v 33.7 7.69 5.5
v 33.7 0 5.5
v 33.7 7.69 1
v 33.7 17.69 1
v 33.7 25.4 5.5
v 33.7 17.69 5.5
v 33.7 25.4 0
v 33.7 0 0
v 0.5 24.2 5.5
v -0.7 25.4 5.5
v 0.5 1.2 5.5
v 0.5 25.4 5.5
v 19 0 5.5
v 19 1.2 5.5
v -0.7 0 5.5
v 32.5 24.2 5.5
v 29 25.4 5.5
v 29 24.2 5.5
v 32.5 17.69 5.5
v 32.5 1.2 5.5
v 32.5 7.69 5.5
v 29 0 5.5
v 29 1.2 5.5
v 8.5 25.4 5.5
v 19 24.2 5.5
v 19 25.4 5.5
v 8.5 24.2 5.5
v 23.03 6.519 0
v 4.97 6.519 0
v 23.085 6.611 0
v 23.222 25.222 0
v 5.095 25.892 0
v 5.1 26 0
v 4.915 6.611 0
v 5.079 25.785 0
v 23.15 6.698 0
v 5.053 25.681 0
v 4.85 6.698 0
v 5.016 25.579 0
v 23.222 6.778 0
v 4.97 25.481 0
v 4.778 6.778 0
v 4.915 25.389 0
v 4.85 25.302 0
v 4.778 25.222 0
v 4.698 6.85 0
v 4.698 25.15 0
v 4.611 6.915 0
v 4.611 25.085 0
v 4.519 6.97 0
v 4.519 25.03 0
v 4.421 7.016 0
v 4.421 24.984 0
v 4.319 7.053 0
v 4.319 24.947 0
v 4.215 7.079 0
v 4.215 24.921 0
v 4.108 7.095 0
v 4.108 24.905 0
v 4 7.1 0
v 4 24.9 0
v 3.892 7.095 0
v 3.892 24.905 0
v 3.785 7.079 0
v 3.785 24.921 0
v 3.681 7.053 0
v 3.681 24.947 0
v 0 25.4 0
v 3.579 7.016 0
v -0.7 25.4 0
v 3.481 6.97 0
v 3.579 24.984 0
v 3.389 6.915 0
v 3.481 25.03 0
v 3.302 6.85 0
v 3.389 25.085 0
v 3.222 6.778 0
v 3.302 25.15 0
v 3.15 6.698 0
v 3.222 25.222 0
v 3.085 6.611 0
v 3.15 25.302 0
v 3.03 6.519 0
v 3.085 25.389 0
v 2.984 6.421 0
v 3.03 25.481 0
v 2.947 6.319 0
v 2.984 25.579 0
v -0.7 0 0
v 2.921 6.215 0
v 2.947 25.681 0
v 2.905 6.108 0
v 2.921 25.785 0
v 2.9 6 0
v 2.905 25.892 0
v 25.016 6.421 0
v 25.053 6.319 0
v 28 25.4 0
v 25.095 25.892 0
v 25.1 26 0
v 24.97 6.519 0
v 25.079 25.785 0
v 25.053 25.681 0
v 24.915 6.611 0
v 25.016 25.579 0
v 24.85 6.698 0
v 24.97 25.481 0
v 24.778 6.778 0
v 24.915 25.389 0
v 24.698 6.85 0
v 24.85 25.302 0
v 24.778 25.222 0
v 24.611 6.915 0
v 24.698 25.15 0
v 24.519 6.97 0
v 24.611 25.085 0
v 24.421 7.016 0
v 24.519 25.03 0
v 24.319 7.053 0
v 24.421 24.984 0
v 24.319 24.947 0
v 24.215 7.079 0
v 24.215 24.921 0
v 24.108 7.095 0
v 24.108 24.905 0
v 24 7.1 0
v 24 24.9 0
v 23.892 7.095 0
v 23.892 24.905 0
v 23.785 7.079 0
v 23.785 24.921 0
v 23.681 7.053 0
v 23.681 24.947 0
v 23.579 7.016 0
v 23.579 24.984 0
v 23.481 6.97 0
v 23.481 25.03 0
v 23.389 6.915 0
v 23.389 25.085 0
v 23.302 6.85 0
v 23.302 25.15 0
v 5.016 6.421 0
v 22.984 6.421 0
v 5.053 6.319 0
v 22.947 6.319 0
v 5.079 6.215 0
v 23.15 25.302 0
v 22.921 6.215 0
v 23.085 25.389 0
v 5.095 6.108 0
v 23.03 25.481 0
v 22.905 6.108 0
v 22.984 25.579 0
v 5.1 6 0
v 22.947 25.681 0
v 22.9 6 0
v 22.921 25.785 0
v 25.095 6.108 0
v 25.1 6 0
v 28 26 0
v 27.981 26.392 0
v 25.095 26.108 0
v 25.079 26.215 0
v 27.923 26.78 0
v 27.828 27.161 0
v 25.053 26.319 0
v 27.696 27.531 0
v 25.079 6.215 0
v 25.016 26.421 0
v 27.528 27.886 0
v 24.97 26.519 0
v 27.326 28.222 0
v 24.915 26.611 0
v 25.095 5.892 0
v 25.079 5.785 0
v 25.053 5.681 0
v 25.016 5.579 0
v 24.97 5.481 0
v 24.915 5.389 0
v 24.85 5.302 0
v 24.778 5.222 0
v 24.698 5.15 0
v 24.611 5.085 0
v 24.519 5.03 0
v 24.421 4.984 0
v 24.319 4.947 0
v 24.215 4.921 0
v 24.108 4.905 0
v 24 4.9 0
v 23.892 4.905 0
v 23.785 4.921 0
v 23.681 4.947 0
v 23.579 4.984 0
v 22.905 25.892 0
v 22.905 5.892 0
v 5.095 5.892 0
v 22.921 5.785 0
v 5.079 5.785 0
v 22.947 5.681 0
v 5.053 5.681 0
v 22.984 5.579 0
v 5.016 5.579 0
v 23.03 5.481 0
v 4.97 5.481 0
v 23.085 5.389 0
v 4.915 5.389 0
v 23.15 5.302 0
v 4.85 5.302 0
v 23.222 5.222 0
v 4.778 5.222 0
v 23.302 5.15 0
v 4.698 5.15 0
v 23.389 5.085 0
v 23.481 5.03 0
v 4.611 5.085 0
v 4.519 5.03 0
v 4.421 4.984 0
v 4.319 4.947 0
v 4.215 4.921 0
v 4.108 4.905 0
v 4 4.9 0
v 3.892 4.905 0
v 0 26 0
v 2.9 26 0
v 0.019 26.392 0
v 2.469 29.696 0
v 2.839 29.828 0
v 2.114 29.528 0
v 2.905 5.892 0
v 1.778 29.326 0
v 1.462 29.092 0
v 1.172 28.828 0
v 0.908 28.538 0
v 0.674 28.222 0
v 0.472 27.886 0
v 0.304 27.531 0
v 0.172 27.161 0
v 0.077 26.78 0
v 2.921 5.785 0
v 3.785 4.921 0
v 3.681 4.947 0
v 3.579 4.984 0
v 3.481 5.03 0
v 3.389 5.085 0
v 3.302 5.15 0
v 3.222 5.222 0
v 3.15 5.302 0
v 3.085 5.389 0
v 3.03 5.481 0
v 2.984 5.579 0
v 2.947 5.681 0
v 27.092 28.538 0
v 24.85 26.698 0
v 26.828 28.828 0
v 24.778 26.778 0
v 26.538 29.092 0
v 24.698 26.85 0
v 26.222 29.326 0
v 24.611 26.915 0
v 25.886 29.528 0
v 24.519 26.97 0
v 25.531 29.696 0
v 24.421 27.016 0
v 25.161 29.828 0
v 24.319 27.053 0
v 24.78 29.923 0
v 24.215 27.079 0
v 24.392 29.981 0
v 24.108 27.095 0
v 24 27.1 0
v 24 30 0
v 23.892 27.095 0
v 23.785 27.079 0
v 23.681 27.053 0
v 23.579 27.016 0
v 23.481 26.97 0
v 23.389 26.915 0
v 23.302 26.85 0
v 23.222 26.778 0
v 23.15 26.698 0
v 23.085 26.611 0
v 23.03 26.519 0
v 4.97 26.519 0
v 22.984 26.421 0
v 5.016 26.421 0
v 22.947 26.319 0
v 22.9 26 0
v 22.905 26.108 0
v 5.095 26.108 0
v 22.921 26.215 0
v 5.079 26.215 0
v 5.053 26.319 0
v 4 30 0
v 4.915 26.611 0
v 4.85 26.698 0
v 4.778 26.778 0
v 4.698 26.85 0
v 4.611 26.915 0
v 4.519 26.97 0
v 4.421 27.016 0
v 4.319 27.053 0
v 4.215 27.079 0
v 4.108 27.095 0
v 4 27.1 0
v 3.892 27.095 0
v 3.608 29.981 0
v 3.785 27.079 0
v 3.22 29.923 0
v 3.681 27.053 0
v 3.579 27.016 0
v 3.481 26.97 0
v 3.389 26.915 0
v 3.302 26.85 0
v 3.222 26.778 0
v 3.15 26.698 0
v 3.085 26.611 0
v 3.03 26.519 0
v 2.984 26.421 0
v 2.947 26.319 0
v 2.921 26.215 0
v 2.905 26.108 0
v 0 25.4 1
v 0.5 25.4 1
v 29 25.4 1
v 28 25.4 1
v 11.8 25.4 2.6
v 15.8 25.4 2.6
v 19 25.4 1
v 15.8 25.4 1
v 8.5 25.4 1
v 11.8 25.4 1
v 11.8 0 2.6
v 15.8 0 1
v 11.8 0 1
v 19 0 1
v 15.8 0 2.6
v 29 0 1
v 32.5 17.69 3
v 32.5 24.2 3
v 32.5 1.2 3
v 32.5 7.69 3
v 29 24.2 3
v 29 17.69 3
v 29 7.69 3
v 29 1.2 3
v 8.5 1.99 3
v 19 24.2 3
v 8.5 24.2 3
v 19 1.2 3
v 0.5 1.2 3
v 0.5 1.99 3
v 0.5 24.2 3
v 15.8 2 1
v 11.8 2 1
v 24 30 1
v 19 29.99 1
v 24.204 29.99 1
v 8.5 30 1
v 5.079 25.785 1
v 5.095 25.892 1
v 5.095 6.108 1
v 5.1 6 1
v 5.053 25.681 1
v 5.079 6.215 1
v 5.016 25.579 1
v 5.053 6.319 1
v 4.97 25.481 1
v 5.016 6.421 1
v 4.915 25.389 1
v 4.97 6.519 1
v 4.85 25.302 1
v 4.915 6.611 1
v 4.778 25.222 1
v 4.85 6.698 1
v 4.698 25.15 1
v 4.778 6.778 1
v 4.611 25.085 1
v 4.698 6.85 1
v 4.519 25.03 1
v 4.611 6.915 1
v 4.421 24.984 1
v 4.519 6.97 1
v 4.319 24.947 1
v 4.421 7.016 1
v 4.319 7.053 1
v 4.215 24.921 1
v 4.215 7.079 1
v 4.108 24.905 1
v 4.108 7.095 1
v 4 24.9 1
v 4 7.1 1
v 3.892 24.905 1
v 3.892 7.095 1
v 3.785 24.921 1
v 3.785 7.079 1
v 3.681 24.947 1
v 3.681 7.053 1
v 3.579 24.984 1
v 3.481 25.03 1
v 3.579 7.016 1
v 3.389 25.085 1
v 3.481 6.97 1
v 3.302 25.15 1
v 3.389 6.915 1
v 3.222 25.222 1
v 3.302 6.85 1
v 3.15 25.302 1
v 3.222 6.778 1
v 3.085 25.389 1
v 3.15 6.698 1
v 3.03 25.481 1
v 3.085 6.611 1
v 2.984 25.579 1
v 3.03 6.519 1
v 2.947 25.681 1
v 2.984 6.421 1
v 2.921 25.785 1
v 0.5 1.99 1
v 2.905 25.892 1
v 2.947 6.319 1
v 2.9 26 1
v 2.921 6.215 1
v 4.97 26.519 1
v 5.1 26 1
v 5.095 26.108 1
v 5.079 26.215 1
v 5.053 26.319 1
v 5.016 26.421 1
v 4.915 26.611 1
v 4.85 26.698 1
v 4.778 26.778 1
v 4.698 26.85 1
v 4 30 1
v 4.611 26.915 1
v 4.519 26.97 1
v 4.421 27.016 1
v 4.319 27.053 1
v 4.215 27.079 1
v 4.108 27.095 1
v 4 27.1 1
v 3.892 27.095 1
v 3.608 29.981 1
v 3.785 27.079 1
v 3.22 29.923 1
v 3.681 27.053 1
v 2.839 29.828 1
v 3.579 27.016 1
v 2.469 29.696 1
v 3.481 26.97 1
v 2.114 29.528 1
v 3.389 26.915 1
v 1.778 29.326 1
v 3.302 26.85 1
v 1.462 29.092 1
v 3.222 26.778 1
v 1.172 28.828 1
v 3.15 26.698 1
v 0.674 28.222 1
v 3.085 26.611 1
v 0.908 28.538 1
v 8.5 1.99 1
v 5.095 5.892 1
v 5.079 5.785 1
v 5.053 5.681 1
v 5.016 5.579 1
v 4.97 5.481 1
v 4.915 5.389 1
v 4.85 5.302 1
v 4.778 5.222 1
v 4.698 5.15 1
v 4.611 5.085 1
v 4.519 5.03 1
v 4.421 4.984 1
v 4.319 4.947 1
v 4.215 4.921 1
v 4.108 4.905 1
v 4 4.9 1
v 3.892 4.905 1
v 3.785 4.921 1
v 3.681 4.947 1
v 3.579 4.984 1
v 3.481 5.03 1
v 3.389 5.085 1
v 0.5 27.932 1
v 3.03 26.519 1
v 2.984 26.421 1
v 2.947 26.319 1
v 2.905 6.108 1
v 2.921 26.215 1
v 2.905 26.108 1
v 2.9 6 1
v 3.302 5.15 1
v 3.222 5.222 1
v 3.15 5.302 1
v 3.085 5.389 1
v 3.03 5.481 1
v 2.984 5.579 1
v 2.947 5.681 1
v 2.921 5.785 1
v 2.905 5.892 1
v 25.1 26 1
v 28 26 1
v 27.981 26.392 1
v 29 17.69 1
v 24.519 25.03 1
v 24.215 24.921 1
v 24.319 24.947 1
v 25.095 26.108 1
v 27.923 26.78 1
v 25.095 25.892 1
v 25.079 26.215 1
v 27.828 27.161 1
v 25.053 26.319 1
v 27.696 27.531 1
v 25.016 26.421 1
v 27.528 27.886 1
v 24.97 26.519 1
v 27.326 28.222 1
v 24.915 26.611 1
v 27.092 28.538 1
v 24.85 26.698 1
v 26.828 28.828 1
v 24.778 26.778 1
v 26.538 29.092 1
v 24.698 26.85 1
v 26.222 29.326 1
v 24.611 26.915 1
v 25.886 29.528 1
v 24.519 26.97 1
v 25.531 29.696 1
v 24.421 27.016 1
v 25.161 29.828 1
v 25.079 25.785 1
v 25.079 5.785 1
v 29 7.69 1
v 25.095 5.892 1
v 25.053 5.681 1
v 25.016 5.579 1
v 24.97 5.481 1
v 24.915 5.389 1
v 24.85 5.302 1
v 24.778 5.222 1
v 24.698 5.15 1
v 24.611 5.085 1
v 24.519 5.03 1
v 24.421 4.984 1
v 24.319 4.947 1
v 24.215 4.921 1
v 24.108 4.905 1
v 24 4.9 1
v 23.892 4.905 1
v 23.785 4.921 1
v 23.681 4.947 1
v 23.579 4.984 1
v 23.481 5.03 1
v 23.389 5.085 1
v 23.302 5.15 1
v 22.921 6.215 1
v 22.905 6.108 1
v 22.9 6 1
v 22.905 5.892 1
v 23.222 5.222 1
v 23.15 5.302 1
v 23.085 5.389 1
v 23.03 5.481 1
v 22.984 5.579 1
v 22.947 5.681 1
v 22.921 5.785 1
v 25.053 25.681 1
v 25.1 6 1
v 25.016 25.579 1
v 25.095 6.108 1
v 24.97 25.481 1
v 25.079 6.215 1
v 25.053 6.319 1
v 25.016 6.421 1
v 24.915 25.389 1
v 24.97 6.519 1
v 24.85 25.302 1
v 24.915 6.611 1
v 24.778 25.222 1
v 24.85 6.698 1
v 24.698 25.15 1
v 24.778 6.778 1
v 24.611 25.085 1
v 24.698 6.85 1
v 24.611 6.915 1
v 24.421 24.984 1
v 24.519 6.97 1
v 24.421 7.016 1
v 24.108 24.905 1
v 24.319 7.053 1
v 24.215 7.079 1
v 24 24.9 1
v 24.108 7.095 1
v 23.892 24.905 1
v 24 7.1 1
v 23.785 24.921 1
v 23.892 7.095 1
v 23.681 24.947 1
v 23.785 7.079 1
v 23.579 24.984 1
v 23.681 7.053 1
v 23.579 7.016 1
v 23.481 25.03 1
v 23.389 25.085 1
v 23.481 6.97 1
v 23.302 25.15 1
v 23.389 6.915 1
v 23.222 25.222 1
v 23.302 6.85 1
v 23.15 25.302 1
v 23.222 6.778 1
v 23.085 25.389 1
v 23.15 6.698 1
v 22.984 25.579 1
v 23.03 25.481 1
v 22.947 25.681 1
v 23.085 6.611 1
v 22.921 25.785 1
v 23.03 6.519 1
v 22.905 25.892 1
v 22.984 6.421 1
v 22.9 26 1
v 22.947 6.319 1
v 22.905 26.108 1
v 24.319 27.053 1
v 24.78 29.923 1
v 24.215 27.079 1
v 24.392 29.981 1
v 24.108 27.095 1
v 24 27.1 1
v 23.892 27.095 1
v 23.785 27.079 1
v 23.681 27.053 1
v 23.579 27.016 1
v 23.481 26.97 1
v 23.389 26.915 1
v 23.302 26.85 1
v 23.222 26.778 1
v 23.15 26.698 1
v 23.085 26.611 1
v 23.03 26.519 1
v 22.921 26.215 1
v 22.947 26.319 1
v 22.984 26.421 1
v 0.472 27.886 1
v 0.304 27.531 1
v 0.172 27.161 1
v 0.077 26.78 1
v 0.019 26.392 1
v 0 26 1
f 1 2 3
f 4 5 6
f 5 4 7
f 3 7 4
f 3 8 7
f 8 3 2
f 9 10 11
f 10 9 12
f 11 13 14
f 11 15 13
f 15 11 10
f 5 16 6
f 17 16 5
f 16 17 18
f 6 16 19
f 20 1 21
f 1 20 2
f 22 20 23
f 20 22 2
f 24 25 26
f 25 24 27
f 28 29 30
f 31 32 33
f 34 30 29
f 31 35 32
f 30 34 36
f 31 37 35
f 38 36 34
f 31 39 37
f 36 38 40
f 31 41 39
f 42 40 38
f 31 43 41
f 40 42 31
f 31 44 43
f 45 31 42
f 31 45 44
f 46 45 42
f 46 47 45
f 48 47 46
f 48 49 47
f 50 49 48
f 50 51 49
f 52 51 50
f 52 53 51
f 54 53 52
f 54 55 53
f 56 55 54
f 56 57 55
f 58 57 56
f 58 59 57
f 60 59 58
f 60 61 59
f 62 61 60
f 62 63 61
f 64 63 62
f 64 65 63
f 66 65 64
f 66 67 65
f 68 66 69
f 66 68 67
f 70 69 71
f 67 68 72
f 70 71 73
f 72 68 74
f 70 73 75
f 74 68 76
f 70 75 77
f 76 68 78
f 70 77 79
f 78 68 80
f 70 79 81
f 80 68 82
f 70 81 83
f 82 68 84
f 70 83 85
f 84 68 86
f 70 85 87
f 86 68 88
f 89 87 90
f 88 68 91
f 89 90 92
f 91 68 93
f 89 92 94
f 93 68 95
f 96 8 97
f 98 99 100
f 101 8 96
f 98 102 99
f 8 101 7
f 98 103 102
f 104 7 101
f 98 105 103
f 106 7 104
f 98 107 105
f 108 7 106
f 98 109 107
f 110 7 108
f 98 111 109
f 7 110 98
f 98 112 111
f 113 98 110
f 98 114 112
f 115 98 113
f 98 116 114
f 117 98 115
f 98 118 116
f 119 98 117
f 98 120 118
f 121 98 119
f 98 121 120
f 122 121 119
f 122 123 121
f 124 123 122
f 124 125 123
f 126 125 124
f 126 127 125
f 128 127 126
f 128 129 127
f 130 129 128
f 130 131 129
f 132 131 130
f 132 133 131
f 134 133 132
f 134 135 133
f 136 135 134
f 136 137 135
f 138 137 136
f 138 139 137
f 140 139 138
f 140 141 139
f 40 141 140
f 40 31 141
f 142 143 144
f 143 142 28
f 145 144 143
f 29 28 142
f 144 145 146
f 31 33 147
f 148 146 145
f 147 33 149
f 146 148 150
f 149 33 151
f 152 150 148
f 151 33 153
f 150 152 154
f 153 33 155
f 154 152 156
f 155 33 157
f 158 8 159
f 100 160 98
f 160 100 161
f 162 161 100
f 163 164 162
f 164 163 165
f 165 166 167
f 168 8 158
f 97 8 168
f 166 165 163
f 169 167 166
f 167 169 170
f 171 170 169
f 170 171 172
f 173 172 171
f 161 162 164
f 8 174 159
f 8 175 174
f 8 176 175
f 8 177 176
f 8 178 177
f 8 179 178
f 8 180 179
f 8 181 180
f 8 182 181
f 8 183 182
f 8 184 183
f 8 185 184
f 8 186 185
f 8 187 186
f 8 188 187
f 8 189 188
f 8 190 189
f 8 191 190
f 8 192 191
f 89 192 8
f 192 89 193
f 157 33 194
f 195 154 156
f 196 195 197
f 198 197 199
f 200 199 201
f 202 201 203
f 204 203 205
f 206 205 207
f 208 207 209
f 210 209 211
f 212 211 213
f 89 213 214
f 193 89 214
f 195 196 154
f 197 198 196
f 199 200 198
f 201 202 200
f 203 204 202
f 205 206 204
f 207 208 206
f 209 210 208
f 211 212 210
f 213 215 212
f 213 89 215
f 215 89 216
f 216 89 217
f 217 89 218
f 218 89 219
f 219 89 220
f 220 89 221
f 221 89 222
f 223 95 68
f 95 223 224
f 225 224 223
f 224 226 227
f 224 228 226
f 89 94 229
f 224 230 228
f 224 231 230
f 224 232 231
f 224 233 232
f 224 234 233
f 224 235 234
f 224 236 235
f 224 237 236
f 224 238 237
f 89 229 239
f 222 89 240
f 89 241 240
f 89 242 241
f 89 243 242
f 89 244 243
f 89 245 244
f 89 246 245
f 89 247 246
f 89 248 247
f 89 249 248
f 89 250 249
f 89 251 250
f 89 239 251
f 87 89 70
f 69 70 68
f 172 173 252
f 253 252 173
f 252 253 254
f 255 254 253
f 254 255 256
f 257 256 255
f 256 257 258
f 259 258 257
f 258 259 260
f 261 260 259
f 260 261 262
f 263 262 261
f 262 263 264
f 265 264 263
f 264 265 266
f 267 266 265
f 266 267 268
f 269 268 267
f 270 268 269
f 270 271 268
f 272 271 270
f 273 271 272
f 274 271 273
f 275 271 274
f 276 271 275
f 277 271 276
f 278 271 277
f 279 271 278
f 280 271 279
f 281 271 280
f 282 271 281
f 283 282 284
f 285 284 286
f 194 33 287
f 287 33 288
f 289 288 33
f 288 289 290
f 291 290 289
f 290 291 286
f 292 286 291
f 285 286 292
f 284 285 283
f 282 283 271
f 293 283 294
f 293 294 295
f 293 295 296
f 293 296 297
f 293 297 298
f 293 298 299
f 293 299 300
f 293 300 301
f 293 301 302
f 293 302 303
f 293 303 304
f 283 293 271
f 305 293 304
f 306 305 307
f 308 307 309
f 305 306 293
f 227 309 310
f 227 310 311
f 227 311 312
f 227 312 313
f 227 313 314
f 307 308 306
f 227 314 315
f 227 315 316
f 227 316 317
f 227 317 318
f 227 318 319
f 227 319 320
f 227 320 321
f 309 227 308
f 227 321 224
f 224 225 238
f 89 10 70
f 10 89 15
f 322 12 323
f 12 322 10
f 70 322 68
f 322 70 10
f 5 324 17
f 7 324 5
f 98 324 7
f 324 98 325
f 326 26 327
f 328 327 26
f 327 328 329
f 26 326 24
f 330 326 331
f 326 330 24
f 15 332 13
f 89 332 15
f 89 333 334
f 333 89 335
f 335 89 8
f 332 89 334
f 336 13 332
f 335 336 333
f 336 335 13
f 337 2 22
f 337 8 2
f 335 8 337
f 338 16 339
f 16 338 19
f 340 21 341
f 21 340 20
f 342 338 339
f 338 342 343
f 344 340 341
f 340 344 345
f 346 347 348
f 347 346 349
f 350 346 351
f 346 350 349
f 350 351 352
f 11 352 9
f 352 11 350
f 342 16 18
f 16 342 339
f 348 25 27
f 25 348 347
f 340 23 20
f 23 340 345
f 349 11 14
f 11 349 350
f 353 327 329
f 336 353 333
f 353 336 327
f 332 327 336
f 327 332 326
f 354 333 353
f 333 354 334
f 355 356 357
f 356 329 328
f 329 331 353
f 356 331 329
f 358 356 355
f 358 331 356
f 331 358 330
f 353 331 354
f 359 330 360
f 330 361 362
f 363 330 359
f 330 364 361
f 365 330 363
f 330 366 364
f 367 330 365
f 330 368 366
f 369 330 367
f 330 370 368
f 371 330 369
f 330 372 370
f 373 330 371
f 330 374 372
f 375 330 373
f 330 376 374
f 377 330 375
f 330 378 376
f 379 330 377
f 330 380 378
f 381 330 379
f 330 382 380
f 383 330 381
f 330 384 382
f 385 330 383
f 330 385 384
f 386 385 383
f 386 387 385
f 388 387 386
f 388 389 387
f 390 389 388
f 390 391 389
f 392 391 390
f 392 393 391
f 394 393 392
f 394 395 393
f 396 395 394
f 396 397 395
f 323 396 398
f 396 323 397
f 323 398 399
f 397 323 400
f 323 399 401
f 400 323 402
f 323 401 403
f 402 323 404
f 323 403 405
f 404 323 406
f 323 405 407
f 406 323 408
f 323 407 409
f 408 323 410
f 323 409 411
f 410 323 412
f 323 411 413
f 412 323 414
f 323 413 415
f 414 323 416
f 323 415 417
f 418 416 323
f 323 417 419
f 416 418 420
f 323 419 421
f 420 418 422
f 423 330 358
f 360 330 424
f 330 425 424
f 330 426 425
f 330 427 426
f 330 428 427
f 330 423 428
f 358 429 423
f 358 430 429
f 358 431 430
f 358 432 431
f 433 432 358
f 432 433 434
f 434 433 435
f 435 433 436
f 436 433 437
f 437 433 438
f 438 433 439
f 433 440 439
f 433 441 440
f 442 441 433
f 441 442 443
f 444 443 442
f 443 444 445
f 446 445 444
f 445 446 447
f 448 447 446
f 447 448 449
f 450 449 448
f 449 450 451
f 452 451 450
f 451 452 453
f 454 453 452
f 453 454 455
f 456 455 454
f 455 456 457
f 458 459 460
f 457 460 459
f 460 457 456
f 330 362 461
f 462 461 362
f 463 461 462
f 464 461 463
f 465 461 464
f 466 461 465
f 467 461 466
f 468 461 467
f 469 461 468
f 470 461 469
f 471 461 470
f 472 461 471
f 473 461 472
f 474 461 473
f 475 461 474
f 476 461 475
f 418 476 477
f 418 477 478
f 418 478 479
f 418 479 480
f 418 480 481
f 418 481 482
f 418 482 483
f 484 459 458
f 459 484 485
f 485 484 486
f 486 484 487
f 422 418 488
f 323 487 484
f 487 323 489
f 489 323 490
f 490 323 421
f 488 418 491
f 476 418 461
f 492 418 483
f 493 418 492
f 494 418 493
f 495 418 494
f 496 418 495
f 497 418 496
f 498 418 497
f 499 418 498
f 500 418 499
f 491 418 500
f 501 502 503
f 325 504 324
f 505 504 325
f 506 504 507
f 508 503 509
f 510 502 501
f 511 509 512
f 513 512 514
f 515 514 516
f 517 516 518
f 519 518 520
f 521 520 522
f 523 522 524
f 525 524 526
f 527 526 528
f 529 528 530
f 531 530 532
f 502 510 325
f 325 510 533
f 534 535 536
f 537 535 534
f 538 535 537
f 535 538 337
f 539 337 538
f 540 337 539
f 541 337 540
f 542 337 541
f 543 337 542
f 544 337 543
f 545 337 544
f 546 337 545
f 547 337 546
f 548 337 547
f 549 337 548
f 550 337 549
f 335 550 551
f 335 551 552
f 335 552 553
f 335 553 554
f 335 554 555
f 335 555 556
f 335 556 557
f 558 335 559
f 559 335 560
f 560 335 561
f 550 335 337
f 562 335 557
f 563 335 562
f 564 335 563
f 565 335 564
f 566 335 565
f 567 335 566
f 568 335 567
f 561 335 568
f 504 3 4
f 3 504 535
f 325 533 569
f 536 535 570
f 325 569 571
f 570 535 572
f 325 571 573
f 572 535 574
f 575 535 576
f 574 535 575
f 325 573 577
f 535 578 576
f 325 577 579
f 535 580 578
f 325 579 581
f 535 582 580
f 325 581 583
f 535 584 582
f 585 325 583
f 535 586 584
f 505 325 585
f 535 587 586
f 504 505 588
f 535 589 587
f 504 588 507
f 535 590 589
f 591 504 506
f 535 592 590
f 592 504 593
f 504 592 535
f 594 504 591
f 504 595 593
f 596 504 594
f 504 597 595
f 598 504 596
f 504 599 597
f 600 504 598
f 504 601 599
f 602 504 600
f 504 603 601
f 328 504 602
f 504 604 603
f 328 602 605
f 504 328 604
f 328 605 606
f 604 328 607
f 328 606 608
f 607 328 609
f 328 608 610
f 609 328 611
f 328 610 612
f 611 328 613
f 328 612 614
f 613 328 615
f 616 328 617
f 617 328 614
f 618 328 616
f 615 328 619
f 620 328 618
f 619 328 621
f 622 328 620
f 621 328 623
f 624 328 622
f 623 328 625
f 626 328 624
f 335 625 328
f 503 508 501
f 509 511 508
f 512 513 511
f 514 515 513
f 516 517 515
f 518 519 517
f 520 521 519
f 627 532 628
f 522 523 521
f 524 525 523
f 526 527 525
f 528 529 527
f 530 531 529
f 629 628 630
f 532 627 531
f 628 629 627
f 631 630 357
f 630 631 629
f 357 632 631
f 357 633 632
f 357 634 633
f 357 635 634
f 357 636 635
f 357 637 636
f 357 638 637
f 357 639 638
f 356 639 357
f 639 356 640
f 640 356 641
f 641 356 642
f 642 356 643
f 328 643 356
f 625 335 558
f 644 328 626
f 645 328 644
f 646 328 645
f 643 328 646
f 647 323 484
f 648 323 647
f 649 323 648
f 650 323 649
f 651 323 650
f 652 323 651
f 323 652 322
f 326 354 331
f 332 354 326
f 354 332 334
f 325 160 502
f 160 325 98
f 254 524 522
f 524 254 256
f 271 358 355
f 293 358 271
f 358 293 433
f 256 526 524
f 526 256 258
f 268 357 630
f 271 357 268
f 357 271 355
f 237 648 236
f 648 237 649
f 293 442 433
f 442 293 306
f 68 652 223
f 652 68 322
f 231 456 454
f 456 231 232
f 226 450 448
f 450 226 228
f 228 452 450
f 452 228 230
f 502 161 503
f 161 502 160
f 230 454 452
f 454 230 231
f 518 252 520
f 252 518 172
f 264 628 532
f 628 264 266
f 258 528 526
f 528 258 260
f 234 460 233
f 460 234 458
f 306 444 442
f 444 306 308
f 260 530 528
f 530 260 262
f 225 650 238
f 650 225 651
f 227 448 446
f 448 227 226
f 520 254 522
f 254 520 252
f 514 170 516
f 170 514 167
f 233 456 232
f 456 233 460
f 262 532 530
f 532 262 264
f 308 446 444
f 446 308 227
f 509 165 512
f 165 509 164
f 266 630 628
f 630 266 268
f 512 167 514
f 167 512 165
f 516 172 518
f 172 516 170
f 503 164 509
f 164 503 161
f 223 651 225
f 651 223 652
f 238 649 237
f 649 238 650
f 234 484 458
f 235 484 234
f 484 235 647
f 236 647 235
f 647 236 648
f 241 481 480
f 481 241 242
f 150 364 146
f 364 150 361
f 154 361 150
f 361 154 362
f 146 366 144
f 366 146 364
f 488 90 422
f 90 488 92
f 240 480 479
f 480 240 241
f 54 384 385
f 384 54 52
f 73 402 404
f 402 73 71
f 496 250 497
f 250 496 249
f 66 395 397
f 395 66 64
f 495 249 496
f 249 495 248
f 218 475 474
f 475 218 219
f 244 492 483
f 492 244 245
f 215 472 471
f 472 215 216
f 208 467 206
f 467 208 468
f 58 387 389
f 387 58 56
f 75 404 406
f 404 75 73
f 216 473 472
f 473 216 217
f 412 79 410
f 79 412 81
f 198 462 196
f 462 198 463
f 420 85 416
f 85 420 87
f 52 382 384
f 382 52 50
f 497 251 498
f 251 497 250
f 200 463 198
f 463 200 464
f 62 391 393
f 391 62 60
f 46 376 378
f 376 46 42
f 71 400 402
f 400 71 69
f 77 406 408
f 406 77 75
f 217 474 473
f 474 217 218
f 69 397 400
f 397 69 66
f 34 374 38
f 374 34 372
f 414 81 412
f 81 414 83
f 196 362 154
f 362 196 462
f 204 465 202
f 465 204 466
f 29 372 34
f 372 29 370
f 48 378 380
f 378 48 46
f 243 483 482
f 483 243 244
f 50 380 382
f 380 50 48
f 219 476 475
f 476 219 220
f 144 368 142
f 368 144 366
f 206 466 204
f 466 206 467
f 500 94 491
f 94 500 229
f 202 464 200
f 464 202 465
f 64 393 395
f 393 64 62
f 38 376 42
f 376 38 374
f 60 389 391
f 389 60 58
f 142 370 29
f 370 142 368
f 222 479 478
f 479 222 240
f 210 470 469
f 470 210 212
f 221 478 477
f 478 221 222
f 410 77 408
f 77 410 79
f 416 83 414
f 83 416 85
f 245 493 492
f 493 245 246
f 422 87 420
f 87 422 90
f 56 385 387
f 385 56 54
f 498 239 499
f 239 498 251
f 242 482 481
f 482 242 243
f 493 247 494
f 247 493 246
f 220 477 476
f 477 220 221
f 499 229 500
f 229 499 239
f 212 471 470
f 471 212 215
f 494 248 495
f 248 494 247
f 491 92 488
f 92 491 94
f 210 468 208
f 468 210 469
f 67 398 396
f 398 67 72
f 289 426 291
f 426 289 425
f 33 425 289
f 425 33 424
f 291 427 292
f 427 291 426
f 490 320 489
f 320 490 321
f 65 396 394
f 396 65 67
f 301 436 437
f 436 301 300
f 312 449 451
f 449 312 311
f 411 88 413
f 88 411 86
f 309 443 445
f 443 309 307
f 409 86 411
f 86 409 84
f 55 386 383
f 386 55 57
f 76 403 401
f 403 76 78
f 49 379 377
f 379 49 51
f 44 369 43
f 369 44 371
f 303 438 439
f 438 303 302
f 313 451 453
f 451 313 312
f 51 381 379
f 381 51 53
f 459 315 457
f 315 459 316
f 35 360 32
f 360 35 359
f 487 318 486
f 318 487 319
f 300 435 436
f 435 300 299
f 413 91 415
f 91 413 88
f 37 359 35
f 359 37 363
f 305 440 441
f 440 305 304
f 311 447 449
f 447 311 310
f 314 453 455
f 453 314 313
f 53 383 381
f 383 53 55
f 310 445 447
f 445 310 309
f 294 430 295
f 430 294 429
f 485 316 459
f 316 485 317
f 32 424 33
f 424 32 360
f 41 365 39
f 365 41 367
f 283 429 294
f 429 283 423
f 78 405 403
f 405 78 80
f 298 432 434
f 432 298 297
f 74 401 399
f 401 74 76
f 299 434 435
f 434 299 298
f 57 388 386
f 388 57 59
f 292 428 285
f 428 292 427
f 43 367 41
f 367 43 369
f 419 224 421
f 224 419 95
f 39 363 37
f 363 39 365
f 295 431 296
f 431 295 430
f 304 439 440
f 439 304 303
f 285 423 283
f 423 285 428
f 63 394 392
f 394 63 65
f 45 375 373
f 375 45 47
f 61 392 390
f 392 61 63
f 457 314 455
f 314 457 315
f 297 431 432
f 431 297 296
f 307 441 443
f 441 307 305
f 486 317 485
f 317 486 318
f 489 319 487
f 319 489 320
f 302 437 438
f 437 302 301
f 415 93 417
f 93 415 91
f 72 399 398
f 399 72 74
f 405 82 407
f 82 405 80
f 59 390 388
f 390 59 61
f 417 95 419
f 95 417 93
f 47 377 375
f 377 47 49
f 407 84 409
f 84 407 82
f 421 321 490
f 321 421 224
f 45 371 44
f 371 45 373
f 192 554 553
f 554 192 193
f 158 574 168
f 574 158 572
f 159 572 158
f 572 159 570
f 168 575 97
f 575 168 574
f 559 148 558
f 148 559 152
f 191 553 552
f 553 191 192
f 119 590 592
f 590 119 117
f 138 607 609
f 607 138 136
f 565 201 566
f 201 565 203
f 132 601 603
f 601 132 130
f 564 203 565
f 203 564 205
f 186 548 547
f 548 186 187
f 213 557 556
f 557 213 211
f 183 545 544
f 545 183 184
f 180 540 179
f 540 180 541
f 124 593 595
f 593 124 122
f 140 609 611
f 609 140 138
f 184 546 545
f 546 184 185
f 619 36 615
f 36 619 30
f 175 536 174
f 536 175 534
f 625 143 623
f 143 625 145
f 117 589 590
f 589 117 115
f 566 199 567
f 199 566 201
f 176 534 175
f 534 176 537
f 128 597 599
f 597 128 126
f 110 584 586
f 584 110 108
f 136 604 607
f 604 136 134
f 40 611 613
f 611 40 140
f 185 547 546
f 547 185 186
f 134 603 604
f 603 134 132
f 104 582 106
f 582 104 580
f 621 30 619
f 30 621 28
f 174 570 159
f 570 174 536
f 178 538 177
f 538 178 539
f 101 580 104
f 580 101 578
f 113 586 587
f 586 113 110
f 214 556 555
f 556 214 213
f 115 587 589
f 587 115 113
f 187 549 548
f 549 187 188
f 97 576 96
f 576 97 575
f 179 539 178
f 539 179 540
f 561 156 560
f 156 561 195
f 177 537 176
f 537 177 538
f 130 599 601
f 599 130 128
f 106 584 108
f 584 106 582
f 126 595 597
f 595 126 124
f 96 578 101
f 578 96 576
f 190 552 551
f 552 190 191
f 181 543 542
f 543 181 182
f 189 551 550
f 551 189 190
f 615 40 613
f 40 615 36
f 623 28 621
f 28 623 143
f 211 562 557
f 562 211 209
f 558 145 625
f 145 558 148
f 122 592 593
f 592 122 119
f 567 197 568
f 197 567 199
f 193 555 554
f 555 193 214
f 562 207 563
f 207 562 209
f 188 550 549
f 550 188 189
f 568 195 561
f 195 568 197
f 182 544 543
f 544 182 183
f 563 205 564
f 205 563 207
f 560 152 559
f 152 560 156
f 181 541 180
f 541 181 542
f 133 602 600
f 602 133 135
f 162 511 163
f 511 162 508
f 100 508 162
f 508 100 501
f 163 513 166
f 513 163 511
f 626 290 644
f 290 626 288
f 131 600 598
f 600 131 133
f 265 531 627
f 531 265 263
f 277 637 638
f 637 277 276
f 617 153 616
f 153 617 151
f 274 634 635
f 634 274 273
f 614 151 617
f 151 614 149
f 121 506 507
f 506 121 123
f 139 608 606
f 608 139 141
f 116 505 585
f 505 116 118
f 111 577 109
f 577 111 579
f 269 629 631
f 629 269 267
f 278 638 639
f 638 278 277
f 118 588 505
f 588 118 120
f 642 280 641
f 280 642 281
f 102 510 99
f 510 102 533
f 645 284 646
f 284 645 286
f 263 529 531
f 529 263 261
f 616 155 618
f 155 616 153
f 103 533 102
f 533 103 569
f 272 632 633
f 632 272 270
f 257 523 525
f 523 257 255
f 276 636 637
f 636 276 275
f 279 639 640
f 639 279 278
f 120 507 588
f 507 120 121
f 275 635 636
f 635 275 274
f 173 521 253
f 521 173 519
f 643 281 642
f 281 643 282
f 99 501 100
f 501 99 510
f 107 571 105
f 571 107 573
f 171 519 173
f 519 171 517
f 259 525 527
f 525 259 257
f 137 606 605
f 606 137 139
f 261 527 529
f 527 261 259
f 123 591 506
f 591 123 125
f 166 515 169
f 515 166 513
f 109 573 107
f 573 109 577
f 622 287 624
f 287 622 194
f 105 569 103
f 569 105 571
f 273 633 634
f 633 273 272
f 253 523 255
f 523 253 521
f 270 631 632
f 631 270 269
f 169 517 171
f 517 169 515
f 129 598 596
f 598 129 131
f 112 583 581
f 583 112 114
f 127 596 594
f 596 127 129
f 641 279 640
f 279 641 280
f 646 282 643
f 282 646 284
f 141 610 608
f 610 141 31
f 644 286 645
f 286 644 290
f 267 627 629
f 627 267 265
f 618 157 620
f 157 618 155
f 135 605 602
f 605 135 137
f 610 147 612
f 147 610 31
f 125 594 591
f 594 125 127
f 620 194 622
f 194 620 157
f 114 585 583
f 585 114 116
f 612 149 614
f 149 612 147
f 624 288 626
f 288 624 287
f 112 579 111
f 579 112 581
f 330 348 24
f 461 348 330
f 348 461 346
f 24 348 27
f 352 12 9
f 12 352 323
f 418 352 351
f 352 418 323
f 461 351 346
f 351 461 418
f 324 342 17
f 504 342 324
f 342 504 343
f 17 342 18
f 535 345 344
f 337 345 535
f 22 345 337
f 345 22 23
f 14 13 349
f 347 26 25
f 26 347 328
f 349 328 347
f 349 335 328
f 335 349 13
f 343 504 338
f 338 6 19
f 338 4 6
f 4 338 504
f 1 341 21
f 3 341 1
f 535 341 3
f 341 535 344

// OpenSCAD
// file: ../Universal/SCAD/rounded_box.scad
/**
 * Small "library" for creating boxes with rounded edges.
 *
 * Hendrik Busch, 2017 (https://github.com/hmbusch)
 *
 */
 
/**
 * Call to create a box with rounded edges (edges will be round on one plane only).
 * Be sure to increase $fn for nicer edges.
 * 
 * @param width
 *          the desired width of the box (default is 10mm)
 * @param depth
 *          the desired depth of the box (default is 10mm)
 * @param height
 *          the desired height of the box (default is 10mm)
 * @param edge_radius
 *          the radius of all the edges on the xy-plane (default is 2mm)
 *
 */
module box_with_round_edges(width = 10, depth = 10, height = 10, edge_radius = 2) {
    translate([edge_radius, edge_radius, 0]) hull() {
        ed = edge_radius * 2;
        cylinder(d = ed, h = height);
        translate([width - ed, 0, 0]) cylinder(d = edge_radius * 2, h = height);
        translate([0, depth - ed, 0]) cylinder(d = edge_radius * 2, h = height);
        translate([width - ed, depth -ed, 0]) cylinder(d = edge_radius * 2, h = height);
    }
}
// main file
use <../Universal/SCAD/rounded_box.scad>;

$fn = 64;

baseplate_xy = 28;
baseplate_z = 1;

tbsunify_x = 32;
tbsunify_y = 23;
tbsunify_z = 1.5;

tbsunify_x_cage_clearance = 2.5;
tbsunify_block_z = 4.5;

bevel_thickness = 2.4;

// Render allowance for clean preview
ra = 0.01;

m2_hole = 2.2;
hole_spacing = 20;
hole_offset_1 = (baseplate_xy - hole_spacing) / 2;
hole_offset_2 = baseplate_xy - hole_offset_1;


module baseplate_20x20() {
    box_with_round_edges(width = baseplate_xy, depth = baseplate_xy, height = baseplate_z, edge_radius = 4);
}

module mounting_holes_20x20() {
    // mounting holes 20x20mm
    translate([hole_offset_1, hole_offset_1, -0.1]) cylinder(d = m2_hole, h = 10);
    translate([hole_offset_1, hole_offset_2, -0.1]) cylinder(d = m2_hole, h = 10);
    translate([hole_offset_2, hole_offset_1, -0.1]) cylinder(d = m2_hole, h = 10);
    translate([hole_offset_2, hole_offset_2, -0.1]) cylinder(d = m2_hole, h = 10);
}

module cable_routing() {
    translate([0.5, 2, 0]) cube([8, 30, tbsunify_block_z + ra]);
    translate([hole_offset_2 - 5, 0, 0]) cube([10, 30, tbsunify_block_z + ra]);
    translate([tbsunify_x + bevel_thickness - 10, (tbsunify_y + bevel_thickness) / 2 - 5, 0]) cube([10, 10,  tbsunify_block_z + ra]);
    
}

module tbsunify_cradle() {
    difference() {
        cube([tbsunify_x + bevel_thickness, tbsunify_y + bevel_thickness, tbsunify_block_z + baseplate_z]);
        translate([bevel_thickness / 2, bevel_thickness /2 , tbsunify_block_z - tbsunify_z]) cube([tbsunify_x, tbsunify_y, tbsunify_z + ra + baseplate_z]);
        translate([12.5, 0, baseplate_z]) cube([4, tbsunify_y + bevel_thickness + 2 * ra, 1.6]);
    }
}

difference() {
    union() {
        translate([0, 2, 0]) baseplate_20x20();
        translate([tbsunify_x_cage_clearance - (tbsunify_x + bevel_thickness - baseplate_xy) / 2, 0]) tbsunify_cradle();
    }
    translate([0, 2, 0]) mounting_holes_20x20();
    translate([0, -ra, baseplate_z]) cable_routing();
}
